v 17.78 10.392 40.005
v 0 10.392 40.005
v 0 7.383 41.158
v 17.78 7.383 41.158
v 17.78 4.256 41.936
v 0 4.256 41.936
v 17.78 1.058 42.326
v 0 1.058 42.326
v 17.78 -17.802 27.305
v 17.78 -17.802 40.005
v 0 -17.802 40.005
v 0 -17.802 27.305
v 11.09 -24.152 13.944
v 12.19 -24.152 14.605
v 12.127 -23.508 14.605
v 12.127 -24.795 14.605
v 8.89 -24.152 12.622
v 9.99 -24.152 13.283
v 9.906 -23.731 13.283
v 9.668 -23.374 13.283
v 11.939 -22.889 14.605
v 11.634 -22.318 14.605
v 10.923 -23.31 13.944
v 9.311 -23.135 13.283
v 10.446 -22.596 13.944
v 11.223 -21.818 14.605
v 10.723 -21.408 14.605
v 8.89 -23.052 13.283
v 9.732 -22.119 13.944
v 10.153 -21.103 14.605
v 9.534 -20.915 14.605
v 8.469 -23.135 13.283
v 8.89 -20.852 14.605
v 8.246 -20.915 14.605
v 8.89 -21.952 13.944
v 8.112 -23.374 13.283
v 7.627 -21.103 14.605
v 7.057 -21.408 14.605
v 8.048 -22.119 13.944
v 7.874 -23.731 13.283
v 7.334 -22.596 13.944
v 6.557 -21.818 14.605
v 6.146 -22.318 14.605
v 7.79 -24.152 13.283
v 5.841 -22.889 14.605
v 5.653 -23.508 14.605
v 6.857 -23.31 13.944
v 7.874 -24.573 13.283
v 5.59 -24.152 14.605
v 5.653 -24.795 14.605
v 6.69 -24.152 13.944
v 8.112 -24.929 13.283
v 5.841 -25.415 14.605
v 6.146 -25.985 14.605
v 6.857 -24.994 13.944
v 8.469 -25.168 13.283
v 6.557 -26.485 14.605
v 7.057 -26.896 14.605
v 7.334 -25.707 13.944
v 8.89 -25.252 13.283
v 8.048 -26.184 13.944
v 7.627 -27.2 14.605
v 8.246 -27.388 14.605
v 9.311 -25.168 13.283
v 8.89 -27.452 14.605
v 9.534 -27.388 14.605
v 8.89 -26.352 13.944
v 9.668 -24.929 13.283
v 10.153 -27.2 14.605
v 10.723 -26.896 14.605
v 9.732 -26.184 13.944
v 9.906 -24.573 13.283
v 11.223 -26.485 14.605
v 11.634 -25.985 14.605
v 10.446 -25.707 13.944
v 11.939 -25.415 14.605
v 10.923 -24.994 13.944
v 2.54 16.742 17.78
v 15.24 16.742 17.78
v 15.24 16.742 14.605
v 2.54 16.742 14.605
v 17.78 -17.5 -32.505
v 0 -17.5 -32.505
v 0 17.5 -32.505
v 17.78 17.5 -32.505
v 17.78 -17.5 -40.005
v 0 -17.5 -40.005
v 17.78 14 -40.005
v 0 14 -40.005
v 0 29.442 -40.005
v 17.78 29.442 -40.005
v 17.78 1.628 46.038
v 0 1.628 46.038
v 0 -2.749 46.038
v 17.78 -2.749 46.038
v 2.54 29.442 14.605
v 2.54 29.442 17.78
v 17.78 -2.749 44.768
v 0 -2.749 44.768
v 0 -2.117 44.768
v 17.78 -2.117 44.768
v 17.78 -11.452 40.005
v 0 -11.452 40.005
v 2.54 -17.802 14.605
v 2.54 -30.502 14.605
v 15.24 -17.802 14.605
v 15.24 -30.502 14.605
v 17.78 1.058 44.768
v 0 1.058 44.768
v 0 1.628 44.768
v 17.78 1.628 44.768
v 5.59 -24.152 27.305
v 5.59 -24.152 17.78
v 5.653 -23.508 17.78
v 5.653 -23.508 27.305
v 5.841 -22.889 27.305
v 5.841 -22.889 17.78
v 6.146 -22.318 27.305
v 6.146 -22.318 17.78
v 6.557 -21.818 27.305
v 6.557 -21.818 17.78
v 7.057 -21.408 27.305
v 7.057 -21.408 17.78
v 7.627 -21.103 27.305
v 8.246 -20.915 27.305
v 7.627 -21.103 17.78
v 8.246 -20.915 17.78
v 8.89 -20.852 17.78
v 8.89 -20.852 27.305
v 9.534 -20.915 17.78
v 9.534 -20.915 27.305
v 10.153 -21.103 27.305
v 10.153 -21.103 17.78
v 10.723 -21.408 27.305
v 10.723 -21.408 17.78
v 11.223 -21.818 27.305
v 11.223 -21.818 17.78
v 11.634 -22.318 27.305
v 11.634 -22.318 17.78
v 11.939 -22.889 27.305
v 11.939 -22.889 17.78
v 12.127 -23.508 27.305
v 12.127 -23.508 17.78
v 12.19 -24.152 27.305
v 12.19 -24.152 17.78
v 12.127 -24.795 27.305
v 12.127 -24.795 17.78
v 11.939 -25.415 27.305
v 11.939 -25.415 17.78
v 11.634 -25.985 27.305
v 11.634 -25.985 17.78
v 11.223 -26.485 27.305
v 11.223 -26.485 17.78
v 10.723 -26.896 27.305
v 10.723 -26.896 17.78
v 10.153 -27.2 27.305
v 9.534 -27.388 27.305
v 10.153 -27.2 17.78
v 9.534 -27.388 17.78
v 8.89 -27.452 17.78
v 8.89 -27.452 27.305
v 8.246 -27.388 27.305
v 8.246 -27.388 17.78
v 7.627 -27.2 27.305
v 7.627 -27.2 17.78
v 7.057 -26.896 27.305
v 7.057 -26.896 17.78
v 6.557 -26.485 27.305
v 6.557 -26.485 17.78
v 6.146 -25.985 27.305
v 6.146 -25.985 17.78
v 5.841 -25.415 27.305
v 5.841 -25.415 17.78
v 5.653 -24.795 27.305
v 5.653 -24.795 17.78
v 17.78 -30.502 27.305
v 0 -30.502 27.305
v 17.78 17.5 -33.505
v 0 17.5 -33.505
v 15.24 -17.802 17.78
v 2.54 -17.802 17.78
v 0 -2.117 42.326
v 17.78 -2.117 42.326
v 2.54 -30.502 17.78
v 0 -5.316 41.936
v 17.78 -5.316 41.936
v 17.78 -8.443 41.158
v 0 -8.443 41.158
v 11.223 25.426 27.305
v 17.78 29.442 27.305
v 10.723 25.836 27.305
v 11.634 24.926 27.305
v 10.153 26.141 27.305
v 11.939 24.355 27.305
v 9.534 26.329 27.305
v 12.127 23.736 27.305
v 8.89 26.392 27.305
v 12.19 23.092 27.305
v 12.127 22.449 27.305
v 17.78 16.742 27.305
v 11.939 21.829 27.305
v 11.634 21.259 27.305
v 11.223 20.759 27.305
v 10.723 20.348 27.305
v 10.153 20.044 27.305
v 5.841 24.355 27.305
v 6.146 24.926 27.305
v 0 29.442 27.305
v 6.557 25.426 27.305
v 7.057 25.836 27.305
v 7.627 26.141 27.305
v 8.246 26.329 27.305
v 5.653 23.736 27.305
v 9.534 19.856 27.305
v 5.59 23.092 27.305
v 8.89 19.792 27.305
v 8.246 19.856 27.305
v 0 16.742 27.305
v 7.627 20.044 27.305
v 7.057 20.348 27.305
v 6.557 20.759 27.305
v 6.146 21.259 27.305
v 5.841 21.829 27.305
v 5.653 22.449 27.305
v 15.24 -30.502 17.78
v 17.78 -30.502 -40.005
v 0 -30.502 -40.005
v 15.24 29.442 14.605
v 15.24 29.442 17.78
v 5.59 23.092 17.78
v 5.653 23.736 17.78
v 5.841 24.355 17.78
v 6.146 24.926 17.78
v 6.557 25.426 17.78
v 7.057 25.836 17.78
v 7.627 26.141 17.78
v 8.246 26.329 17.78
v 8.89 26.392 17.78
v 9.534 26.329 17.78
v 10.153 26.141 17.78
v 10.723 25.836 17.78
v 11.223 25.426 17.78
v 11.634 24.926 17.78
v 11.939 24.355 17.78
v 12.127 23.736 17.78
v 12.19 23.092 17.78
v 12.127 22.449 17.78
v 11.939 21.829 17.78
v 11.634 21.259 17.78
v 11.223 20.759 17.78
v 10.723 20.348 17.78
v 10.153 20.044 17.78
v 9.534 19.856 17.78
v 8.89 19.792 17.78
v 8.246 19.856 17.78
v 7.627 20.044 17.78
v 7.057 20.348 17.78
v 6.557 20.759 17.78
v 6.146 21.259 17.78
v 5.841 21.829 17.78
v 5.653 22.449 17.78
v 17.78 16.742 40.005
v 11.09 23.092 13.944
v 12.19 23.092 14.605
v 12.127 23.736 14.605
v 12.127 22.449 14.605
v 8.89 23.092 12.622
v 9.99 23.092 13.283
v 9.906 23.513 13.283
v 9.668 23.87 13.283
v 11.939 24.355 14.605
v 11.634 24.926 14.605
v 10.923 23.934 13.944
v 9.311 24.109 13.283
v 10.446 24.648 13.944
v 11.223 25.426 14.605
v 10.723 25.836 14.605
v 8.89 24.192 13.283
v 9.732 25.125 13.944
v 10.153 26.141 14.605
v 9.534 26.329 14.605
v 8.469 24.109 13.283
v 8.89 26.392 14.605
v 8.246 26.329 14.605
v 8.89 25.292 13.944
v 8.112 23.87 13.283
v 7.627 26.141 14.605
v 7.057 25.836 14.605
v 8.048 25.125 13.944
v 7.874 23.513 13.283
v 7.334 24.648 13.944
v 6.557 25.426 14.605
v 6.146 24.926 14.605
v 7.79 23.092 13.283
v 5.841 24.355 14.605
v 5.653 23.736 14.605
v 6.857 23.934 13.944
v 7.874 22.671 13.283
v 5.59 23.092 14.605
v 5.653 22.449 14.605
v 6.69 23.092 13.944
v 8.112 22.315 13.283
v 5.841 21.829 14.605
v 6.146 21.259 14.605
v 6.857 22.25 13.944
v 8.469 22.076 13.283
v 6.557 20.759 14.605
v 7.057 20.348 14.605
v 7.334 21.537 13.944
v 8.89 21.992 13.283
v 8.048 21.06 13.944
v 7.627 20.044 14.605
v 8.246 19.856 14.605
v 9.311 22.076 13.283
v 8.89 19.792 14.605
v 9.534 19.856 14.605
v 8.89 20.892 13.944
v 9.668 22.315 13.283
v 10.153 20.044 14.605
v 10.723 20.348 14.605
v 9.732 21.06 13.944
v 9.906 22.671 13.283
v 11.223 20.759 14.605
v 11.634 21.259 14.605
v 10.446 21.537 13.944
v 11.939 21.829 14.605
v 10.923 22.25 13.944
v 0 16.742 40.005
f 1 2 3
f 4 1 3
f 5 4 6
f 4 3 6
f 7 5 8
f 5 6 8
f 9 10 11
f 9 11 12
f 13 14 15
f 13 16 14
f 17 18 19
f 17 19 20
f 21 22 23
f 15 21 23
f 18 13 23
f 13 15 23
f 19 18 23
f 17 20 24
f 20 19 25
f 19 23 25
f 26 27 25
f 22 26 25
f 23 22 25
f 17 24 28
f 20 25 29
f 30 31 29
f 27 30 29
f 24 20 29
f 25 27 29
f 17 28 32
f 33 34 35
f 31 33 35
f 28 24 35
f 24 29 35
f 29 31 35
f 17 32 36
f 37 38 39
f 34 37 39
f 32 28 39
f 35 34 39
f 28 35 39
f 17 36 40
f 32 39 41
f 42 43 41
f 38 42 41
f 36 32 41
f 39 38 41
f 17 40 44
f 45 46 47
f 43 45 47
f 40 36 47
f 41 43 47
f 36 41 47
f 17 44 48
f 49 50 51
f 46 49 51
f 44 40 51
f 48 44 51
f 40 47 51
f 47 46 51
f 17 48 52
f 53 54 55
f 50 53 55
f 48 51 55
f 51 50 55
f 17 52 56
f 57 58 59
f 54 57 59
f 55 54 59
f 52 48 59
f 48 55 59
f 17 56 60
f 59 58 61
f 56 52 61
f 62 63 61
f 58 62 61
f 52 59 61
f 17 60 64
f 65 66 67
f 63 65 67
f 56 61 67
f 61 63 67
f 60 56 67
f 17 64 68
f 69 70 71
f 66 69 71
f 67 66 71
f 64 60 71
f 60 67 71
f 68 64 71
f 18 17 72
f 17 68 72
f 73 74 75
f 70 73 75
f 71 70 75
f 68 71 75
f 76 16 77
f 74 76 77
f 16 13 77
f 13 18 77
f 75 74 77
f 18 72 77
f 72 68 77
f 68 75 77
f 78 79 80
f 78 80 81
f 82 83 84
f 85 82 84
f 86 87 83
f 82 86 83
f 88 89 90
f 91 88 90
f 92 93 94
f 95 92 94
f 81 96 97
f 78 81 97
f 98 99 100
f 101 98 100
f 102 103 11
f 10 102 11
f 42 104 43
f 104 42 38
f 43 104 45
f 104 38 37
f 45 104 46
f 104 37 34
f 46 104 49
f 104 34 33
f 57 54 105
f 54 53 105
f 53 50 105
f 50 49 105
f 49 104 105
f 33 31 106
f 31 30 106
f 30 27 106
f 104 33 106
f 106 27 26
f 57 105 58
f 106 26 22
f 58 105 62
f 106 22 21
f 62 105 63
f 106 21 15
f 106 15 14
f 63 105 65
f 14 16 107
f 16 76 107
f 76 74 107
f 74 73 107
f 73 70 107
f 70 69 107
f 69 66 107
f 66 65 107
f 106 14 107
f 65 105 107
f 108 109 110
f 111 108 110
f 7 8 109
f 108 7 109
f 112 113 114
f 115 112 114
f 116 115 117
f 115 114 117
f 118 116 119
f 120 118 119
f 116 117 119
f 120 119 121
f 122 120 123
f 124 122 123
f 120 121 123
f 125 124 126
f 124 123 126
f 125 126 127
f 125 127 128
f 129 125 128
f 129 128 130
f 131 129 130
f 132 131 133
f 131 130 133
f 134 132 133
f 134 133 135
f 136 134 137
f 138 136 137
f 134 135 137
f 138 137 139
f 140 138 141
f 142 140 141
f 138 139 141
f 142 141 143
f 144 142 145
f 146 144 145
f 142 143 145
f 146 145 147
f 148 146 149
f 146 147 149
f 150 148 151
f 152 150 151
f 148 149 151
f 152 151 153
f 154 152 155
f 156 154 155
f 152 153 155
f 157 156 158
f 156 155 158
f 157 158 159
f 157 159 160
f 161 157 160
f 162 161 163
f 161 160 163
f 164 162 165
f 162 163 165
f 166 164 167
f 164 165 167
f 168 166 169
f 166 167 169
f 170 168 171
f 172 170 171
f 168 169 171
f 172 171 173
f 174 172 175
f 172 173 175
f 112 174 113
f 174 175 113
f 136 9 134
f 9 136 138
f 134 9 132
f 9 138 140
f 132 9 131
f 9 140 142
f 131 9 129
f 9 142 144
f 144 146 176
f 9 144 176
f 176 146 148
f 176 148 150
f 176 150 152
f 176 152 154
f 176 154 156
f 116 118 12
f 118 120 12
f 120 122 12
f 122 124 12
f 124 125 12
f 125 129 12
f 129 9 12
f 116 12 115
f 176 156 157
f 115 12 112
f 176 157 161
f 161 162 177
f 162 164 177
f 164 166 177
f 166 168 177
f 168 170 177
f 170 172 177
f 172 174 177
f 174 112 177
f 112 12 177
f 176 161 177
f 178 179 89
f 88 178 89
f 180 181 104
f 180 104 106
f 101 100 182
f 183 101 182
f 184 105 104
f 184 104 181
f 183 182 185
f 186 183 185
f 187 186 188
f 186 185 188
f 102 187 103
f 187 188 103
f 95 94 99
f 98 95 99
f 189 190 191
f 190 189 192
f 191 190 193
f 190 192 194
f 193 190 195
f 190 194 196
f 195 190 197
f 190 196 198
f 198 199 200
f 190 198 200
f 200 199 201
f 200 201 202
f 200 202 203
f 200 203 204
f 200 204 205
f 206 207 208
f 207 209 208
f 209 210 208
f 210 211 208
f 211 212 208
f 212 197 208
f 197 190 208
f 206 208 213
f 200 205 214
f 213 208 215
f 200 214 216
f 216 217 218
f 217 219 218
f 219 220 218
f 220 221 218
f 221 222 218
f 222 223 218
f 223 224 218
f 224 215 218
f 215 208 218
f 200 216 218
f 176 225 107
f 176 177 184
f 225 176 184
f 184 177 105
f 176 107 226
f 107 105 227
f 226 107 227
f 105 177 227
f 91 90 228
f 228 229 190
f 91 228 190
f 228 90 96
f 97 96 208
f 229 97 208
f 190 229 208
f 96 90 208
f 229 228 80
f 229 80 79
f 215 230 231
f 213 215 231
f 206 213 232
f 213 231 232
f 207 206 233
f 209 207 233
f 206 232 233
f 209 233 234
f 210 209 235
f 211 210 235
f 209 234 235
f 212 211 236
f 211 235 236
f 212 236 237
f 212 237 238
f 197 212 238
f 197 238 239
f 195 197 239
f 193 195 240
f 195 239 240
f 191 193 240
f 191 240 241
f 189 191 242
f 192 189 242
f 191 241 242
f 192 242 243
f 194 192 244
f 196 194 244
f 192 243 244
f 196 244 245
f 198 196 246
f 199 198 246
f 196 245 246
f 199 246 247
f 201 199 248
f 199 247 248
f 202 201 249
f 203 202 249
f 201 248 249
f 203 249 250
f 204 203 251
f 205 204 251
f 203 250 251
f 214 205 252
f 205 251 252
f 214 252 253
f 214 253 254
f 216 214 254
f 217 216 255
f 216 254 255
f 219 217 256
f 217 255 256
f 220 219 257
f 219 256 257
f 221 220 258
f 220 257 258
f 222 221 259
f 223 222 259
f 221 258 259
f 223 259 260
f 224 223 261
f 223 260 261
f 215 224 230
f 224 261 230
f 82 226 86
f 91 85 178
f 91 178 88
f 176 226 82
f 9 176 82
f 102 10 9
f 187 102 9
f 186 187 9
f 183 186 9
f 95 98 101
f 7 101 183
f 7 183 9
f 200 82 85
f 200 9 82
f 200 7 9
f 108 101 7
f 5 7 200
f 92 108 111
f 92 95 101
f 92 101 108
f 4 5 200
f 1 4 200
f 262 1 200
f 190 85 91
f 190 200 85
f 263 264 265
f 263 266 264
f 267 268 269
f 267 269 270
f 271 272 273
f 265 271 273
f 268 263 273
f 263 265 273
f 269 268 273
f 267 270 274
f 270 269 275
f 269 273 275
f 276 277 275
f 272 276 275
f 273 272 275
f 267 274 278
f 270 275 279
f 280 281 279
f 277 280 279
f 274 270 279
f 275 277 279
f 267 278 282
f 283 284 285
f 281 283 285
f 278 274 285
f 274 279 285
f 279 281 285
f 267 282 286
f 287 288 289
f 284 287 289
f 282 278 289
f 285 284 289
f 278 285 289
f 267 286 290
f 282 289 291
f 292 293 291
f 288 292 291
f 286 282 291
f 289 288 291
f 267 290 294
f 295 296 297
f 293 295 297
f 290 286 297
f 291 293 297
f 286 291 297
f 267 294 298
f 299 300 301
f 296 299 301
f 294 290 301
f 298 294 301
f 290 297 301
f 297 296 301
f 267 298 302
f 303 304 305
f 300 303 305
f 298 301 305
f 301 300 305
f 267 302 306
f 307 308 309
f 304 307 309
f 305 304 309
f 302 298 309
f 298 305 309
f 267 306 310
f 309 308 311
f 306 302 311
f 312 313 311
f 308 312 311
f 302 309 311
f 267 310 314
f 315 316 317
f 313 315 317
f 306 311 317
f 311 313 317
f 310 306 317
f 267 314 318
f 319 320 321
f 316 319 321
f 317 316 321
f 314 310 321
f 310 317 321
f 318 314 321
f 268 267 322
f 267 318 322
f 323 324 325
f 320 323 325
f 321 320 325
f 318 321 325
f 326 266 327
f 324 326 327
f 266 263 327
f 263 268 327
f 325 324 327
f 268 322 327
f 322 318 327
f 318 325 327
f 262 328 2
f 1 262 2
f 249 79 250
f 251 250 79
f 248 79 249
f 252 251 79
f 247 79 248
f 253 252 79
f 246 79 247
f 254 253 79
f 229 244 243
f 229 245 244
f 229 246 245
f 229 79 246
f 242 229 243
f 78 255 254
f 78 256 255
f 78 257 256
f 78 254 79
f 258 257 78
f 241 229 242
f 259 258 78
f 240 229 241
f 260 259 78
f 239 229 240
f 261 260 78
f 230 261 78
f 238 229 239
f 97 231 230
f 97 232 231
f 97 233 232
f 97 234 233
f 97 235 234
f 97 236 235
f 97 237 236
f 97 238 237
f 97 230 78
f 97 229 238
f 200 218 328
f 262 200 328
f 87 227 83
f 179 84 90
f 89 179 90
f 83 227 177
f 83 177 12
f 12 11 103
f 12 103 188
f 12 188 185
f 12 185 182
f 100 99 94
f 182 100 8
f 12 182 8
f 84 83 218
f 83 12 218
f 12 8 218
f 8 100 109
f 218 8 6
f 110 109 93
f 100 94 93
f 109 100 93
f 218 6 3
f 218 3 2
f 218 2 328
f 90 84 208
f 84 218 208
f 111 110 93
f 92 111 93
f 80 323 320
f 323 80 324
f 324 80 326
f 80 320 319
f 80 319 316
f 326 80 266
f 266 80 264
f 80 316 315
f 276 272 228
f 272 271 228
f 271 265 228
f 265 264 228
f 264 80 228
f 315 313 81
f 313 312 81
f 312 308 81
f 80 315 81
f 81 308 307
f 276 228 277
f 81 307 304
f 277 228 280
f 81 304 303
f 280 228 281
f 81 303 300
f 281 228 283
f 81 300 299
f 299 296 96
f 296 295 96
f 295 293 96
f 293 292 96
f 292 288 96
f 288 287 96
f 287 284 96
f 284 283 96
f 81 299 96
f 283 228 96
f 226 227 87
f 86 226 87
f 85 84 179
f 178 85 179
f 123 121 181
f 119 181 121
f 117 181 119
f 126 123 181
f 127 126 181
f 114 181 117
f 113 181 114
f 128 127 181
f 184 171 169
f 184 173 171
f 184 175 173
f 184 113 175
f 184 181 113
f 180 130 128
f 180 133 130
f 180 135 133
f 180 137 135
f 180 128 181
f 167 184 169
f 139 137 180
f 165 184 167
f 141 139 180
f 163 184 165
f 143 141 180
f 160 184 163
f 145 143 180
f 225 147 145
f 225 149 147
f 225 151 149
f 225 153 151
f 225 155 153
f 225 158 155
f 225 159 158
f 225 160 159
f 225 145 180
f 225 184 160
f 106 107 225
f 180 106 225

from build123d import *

# Parameters (mm, degrees)
F1_DEPTH       = 17.78
F0_W           = 3.175
F0_H           = 0.3175
F2_DEPTH       = 17.78
F5_D           = 6.6
F5_DEPTH       = 12.7
F5_TIP         = 1.9828400428
F5_ON_F3_D     = 6.6
F5_ON_F3_DEPTH = 12.7
F5_ON_F3_TIP   = 1.9828400428
F6_W           = 12.7
F6_H           = 3.175
F8_DEPTH       = 12.7
F7_W           = 12.7
F7_H           = 3.175
F9_DEPTH       = 12.7


with BuildPart() as f1:
    # F0 (on Right) → F1 (new body)
    with BuildSketch(Plane.YZ):
        Polygon((-11.4516578615, 40.005), (-17.8016578615, 40.005), (-17.8016578615, 27.305), (-30.5016578615, 27.305), (-30.5016578615, -40.005), (-17.5, -40.005), (-17.5, -33.505), (-17.5, -32.505), (17.5, -32.505), (17.5, -33.505), (14, -40.005), (29.4423421385, -40.005), (29.4423421385, 27.305), (16.7423421385, 27.305), (16.7423421385, 40.005), (10.3923421385, 40.005), (1.0578421385, 40.005), (-0.5296578615, 40.005), (-2.1171578615, 40.005), align=None)
    extrude(amount=F1_DEPTH)

    # F0 (on Right) → F2 (join, through all)
    with BuildSketch(Plane.YZ):
        with BuildLine():
            ThreePointArc((10.3923421385, 40.005), (5.8318480853, 41.5948737402), (1.0578421385, 42.3260862531))
            Line((1.0578421385, 42.3260862531), (1.0578421385, 40.005))
            Line((1.0578421385, 40.005), (10.3923421385, 40.005))
        make_face()
        with BuildLine():
            Line((-2.1171578615, 42.3260862531), (-2.1171578615, 40.005))
            Line((-2.1171578615, 40.005), (-0.5296578615, 40.005))
            Line((-0.5296578615, 40.005), (1.0578421385, 40.005))
            Line((1.0578421385, 40.005), (1.0578421385, 42.3260862531))
            ThreePointArc((1.0578421385, 42.3260862531), (-0.5296578615, 42.3739277182), (-2.1171578615, 42.3260862531))
        make_face()
        with BuildLine():
            ThreePointArc((-2.1171578615, 42.3260862531), (-6.8911638083, 41.5948737402), (-11.4516578615, 40.005))
            Line((-11.4516578615, 40.005), (-2.1171578615, 40.005))
            Line((-2.1171578615, 40.005), (-2.1171578615, 42.3260862531))
        make_face()
        with BuildLine():
            Line((-2.1171578615, 44.7675), (-2.1171578615, 42.3260862531))
            ThreePointArc((-2.1171578615, 42.3260862531), (-0.5296578615, 42.3739277182), (1.0578421385, 42.3260862531))
            Line((1.0578421385, 42.3260862531), (1.0578421385, 44.7675))
            Line((1.0578421385, 44.7675), (-2.1171578615, 44.7675))
        make_face()
        with Locations((-0.5296578615, 44.92625)):
            Rectangle(F0_W, F0_H)
        Polygon((-2.7487089392, 44.7675), (-2.1171578615, 44.7675), (-2.1171578615, 45.085), (1.0578421385, 45.085), (1.0578421385, 44.7675), (1.628424623, 44.7675), (1.628424623, 46.0375), (-2.7487089392, 46.0375), align=None)
    extrude(amount=F2_DEPTH)

    # F5
    with Locations(Plane.XY.offset(27.305)):
        with Locations((8.89, 23.0923421385)):
            Hole(F5_D / 2, depth=F5_DEPTH)
            with Locations((0, 0, -(F5_DEPTH + F5_TIP / 2))):  # 118° drill point
                Cone(0, F5_D / 2, F5_TIP, mode=Mode.SUBTRACT)

    # F5 on F3
    with Locations(Plane.XY.offset(27.305)):
        with Locations((8.89, -24.1516578615)):
            Hole(F5_ON_F3_D / 2, depth=F5_ON_F3_DEPTH)
            with Locations((0, 0, -(F5_ON_F3_DEPTH + F5_ON_F3_TIP / 2))):  # 118° drill point
                Cone(0, F5_ON_F3_D / 2, F5_ON_F3_TIP, mode=Mode.SUBTRACT)

    # F6 (on face) → F8 (cut)
    with BuildSketch(Plane.XZ.offset(30.5016578615)):
        with Locations((8.89, 16.1925)):
            Rectangle(F6_W, F6_H)
    extrude(amount=-F8_DEPTH, mode=Mode.SUBTRACT)

    # F7 (on face) → F9 (cut)
    with BuildSketch(Plane(origin=(0, 29.4423421385, 0), x_dir=(-1, 0, 0), z_dir=(0, 1, 0))):
        with Locations((-8.89, 16.1925)):
            Rectangle(F7_W, F7_H)
    extrude(amount=-F9_DEPTH, mode=Mode.SUBTRACT)


solid = f1.part
